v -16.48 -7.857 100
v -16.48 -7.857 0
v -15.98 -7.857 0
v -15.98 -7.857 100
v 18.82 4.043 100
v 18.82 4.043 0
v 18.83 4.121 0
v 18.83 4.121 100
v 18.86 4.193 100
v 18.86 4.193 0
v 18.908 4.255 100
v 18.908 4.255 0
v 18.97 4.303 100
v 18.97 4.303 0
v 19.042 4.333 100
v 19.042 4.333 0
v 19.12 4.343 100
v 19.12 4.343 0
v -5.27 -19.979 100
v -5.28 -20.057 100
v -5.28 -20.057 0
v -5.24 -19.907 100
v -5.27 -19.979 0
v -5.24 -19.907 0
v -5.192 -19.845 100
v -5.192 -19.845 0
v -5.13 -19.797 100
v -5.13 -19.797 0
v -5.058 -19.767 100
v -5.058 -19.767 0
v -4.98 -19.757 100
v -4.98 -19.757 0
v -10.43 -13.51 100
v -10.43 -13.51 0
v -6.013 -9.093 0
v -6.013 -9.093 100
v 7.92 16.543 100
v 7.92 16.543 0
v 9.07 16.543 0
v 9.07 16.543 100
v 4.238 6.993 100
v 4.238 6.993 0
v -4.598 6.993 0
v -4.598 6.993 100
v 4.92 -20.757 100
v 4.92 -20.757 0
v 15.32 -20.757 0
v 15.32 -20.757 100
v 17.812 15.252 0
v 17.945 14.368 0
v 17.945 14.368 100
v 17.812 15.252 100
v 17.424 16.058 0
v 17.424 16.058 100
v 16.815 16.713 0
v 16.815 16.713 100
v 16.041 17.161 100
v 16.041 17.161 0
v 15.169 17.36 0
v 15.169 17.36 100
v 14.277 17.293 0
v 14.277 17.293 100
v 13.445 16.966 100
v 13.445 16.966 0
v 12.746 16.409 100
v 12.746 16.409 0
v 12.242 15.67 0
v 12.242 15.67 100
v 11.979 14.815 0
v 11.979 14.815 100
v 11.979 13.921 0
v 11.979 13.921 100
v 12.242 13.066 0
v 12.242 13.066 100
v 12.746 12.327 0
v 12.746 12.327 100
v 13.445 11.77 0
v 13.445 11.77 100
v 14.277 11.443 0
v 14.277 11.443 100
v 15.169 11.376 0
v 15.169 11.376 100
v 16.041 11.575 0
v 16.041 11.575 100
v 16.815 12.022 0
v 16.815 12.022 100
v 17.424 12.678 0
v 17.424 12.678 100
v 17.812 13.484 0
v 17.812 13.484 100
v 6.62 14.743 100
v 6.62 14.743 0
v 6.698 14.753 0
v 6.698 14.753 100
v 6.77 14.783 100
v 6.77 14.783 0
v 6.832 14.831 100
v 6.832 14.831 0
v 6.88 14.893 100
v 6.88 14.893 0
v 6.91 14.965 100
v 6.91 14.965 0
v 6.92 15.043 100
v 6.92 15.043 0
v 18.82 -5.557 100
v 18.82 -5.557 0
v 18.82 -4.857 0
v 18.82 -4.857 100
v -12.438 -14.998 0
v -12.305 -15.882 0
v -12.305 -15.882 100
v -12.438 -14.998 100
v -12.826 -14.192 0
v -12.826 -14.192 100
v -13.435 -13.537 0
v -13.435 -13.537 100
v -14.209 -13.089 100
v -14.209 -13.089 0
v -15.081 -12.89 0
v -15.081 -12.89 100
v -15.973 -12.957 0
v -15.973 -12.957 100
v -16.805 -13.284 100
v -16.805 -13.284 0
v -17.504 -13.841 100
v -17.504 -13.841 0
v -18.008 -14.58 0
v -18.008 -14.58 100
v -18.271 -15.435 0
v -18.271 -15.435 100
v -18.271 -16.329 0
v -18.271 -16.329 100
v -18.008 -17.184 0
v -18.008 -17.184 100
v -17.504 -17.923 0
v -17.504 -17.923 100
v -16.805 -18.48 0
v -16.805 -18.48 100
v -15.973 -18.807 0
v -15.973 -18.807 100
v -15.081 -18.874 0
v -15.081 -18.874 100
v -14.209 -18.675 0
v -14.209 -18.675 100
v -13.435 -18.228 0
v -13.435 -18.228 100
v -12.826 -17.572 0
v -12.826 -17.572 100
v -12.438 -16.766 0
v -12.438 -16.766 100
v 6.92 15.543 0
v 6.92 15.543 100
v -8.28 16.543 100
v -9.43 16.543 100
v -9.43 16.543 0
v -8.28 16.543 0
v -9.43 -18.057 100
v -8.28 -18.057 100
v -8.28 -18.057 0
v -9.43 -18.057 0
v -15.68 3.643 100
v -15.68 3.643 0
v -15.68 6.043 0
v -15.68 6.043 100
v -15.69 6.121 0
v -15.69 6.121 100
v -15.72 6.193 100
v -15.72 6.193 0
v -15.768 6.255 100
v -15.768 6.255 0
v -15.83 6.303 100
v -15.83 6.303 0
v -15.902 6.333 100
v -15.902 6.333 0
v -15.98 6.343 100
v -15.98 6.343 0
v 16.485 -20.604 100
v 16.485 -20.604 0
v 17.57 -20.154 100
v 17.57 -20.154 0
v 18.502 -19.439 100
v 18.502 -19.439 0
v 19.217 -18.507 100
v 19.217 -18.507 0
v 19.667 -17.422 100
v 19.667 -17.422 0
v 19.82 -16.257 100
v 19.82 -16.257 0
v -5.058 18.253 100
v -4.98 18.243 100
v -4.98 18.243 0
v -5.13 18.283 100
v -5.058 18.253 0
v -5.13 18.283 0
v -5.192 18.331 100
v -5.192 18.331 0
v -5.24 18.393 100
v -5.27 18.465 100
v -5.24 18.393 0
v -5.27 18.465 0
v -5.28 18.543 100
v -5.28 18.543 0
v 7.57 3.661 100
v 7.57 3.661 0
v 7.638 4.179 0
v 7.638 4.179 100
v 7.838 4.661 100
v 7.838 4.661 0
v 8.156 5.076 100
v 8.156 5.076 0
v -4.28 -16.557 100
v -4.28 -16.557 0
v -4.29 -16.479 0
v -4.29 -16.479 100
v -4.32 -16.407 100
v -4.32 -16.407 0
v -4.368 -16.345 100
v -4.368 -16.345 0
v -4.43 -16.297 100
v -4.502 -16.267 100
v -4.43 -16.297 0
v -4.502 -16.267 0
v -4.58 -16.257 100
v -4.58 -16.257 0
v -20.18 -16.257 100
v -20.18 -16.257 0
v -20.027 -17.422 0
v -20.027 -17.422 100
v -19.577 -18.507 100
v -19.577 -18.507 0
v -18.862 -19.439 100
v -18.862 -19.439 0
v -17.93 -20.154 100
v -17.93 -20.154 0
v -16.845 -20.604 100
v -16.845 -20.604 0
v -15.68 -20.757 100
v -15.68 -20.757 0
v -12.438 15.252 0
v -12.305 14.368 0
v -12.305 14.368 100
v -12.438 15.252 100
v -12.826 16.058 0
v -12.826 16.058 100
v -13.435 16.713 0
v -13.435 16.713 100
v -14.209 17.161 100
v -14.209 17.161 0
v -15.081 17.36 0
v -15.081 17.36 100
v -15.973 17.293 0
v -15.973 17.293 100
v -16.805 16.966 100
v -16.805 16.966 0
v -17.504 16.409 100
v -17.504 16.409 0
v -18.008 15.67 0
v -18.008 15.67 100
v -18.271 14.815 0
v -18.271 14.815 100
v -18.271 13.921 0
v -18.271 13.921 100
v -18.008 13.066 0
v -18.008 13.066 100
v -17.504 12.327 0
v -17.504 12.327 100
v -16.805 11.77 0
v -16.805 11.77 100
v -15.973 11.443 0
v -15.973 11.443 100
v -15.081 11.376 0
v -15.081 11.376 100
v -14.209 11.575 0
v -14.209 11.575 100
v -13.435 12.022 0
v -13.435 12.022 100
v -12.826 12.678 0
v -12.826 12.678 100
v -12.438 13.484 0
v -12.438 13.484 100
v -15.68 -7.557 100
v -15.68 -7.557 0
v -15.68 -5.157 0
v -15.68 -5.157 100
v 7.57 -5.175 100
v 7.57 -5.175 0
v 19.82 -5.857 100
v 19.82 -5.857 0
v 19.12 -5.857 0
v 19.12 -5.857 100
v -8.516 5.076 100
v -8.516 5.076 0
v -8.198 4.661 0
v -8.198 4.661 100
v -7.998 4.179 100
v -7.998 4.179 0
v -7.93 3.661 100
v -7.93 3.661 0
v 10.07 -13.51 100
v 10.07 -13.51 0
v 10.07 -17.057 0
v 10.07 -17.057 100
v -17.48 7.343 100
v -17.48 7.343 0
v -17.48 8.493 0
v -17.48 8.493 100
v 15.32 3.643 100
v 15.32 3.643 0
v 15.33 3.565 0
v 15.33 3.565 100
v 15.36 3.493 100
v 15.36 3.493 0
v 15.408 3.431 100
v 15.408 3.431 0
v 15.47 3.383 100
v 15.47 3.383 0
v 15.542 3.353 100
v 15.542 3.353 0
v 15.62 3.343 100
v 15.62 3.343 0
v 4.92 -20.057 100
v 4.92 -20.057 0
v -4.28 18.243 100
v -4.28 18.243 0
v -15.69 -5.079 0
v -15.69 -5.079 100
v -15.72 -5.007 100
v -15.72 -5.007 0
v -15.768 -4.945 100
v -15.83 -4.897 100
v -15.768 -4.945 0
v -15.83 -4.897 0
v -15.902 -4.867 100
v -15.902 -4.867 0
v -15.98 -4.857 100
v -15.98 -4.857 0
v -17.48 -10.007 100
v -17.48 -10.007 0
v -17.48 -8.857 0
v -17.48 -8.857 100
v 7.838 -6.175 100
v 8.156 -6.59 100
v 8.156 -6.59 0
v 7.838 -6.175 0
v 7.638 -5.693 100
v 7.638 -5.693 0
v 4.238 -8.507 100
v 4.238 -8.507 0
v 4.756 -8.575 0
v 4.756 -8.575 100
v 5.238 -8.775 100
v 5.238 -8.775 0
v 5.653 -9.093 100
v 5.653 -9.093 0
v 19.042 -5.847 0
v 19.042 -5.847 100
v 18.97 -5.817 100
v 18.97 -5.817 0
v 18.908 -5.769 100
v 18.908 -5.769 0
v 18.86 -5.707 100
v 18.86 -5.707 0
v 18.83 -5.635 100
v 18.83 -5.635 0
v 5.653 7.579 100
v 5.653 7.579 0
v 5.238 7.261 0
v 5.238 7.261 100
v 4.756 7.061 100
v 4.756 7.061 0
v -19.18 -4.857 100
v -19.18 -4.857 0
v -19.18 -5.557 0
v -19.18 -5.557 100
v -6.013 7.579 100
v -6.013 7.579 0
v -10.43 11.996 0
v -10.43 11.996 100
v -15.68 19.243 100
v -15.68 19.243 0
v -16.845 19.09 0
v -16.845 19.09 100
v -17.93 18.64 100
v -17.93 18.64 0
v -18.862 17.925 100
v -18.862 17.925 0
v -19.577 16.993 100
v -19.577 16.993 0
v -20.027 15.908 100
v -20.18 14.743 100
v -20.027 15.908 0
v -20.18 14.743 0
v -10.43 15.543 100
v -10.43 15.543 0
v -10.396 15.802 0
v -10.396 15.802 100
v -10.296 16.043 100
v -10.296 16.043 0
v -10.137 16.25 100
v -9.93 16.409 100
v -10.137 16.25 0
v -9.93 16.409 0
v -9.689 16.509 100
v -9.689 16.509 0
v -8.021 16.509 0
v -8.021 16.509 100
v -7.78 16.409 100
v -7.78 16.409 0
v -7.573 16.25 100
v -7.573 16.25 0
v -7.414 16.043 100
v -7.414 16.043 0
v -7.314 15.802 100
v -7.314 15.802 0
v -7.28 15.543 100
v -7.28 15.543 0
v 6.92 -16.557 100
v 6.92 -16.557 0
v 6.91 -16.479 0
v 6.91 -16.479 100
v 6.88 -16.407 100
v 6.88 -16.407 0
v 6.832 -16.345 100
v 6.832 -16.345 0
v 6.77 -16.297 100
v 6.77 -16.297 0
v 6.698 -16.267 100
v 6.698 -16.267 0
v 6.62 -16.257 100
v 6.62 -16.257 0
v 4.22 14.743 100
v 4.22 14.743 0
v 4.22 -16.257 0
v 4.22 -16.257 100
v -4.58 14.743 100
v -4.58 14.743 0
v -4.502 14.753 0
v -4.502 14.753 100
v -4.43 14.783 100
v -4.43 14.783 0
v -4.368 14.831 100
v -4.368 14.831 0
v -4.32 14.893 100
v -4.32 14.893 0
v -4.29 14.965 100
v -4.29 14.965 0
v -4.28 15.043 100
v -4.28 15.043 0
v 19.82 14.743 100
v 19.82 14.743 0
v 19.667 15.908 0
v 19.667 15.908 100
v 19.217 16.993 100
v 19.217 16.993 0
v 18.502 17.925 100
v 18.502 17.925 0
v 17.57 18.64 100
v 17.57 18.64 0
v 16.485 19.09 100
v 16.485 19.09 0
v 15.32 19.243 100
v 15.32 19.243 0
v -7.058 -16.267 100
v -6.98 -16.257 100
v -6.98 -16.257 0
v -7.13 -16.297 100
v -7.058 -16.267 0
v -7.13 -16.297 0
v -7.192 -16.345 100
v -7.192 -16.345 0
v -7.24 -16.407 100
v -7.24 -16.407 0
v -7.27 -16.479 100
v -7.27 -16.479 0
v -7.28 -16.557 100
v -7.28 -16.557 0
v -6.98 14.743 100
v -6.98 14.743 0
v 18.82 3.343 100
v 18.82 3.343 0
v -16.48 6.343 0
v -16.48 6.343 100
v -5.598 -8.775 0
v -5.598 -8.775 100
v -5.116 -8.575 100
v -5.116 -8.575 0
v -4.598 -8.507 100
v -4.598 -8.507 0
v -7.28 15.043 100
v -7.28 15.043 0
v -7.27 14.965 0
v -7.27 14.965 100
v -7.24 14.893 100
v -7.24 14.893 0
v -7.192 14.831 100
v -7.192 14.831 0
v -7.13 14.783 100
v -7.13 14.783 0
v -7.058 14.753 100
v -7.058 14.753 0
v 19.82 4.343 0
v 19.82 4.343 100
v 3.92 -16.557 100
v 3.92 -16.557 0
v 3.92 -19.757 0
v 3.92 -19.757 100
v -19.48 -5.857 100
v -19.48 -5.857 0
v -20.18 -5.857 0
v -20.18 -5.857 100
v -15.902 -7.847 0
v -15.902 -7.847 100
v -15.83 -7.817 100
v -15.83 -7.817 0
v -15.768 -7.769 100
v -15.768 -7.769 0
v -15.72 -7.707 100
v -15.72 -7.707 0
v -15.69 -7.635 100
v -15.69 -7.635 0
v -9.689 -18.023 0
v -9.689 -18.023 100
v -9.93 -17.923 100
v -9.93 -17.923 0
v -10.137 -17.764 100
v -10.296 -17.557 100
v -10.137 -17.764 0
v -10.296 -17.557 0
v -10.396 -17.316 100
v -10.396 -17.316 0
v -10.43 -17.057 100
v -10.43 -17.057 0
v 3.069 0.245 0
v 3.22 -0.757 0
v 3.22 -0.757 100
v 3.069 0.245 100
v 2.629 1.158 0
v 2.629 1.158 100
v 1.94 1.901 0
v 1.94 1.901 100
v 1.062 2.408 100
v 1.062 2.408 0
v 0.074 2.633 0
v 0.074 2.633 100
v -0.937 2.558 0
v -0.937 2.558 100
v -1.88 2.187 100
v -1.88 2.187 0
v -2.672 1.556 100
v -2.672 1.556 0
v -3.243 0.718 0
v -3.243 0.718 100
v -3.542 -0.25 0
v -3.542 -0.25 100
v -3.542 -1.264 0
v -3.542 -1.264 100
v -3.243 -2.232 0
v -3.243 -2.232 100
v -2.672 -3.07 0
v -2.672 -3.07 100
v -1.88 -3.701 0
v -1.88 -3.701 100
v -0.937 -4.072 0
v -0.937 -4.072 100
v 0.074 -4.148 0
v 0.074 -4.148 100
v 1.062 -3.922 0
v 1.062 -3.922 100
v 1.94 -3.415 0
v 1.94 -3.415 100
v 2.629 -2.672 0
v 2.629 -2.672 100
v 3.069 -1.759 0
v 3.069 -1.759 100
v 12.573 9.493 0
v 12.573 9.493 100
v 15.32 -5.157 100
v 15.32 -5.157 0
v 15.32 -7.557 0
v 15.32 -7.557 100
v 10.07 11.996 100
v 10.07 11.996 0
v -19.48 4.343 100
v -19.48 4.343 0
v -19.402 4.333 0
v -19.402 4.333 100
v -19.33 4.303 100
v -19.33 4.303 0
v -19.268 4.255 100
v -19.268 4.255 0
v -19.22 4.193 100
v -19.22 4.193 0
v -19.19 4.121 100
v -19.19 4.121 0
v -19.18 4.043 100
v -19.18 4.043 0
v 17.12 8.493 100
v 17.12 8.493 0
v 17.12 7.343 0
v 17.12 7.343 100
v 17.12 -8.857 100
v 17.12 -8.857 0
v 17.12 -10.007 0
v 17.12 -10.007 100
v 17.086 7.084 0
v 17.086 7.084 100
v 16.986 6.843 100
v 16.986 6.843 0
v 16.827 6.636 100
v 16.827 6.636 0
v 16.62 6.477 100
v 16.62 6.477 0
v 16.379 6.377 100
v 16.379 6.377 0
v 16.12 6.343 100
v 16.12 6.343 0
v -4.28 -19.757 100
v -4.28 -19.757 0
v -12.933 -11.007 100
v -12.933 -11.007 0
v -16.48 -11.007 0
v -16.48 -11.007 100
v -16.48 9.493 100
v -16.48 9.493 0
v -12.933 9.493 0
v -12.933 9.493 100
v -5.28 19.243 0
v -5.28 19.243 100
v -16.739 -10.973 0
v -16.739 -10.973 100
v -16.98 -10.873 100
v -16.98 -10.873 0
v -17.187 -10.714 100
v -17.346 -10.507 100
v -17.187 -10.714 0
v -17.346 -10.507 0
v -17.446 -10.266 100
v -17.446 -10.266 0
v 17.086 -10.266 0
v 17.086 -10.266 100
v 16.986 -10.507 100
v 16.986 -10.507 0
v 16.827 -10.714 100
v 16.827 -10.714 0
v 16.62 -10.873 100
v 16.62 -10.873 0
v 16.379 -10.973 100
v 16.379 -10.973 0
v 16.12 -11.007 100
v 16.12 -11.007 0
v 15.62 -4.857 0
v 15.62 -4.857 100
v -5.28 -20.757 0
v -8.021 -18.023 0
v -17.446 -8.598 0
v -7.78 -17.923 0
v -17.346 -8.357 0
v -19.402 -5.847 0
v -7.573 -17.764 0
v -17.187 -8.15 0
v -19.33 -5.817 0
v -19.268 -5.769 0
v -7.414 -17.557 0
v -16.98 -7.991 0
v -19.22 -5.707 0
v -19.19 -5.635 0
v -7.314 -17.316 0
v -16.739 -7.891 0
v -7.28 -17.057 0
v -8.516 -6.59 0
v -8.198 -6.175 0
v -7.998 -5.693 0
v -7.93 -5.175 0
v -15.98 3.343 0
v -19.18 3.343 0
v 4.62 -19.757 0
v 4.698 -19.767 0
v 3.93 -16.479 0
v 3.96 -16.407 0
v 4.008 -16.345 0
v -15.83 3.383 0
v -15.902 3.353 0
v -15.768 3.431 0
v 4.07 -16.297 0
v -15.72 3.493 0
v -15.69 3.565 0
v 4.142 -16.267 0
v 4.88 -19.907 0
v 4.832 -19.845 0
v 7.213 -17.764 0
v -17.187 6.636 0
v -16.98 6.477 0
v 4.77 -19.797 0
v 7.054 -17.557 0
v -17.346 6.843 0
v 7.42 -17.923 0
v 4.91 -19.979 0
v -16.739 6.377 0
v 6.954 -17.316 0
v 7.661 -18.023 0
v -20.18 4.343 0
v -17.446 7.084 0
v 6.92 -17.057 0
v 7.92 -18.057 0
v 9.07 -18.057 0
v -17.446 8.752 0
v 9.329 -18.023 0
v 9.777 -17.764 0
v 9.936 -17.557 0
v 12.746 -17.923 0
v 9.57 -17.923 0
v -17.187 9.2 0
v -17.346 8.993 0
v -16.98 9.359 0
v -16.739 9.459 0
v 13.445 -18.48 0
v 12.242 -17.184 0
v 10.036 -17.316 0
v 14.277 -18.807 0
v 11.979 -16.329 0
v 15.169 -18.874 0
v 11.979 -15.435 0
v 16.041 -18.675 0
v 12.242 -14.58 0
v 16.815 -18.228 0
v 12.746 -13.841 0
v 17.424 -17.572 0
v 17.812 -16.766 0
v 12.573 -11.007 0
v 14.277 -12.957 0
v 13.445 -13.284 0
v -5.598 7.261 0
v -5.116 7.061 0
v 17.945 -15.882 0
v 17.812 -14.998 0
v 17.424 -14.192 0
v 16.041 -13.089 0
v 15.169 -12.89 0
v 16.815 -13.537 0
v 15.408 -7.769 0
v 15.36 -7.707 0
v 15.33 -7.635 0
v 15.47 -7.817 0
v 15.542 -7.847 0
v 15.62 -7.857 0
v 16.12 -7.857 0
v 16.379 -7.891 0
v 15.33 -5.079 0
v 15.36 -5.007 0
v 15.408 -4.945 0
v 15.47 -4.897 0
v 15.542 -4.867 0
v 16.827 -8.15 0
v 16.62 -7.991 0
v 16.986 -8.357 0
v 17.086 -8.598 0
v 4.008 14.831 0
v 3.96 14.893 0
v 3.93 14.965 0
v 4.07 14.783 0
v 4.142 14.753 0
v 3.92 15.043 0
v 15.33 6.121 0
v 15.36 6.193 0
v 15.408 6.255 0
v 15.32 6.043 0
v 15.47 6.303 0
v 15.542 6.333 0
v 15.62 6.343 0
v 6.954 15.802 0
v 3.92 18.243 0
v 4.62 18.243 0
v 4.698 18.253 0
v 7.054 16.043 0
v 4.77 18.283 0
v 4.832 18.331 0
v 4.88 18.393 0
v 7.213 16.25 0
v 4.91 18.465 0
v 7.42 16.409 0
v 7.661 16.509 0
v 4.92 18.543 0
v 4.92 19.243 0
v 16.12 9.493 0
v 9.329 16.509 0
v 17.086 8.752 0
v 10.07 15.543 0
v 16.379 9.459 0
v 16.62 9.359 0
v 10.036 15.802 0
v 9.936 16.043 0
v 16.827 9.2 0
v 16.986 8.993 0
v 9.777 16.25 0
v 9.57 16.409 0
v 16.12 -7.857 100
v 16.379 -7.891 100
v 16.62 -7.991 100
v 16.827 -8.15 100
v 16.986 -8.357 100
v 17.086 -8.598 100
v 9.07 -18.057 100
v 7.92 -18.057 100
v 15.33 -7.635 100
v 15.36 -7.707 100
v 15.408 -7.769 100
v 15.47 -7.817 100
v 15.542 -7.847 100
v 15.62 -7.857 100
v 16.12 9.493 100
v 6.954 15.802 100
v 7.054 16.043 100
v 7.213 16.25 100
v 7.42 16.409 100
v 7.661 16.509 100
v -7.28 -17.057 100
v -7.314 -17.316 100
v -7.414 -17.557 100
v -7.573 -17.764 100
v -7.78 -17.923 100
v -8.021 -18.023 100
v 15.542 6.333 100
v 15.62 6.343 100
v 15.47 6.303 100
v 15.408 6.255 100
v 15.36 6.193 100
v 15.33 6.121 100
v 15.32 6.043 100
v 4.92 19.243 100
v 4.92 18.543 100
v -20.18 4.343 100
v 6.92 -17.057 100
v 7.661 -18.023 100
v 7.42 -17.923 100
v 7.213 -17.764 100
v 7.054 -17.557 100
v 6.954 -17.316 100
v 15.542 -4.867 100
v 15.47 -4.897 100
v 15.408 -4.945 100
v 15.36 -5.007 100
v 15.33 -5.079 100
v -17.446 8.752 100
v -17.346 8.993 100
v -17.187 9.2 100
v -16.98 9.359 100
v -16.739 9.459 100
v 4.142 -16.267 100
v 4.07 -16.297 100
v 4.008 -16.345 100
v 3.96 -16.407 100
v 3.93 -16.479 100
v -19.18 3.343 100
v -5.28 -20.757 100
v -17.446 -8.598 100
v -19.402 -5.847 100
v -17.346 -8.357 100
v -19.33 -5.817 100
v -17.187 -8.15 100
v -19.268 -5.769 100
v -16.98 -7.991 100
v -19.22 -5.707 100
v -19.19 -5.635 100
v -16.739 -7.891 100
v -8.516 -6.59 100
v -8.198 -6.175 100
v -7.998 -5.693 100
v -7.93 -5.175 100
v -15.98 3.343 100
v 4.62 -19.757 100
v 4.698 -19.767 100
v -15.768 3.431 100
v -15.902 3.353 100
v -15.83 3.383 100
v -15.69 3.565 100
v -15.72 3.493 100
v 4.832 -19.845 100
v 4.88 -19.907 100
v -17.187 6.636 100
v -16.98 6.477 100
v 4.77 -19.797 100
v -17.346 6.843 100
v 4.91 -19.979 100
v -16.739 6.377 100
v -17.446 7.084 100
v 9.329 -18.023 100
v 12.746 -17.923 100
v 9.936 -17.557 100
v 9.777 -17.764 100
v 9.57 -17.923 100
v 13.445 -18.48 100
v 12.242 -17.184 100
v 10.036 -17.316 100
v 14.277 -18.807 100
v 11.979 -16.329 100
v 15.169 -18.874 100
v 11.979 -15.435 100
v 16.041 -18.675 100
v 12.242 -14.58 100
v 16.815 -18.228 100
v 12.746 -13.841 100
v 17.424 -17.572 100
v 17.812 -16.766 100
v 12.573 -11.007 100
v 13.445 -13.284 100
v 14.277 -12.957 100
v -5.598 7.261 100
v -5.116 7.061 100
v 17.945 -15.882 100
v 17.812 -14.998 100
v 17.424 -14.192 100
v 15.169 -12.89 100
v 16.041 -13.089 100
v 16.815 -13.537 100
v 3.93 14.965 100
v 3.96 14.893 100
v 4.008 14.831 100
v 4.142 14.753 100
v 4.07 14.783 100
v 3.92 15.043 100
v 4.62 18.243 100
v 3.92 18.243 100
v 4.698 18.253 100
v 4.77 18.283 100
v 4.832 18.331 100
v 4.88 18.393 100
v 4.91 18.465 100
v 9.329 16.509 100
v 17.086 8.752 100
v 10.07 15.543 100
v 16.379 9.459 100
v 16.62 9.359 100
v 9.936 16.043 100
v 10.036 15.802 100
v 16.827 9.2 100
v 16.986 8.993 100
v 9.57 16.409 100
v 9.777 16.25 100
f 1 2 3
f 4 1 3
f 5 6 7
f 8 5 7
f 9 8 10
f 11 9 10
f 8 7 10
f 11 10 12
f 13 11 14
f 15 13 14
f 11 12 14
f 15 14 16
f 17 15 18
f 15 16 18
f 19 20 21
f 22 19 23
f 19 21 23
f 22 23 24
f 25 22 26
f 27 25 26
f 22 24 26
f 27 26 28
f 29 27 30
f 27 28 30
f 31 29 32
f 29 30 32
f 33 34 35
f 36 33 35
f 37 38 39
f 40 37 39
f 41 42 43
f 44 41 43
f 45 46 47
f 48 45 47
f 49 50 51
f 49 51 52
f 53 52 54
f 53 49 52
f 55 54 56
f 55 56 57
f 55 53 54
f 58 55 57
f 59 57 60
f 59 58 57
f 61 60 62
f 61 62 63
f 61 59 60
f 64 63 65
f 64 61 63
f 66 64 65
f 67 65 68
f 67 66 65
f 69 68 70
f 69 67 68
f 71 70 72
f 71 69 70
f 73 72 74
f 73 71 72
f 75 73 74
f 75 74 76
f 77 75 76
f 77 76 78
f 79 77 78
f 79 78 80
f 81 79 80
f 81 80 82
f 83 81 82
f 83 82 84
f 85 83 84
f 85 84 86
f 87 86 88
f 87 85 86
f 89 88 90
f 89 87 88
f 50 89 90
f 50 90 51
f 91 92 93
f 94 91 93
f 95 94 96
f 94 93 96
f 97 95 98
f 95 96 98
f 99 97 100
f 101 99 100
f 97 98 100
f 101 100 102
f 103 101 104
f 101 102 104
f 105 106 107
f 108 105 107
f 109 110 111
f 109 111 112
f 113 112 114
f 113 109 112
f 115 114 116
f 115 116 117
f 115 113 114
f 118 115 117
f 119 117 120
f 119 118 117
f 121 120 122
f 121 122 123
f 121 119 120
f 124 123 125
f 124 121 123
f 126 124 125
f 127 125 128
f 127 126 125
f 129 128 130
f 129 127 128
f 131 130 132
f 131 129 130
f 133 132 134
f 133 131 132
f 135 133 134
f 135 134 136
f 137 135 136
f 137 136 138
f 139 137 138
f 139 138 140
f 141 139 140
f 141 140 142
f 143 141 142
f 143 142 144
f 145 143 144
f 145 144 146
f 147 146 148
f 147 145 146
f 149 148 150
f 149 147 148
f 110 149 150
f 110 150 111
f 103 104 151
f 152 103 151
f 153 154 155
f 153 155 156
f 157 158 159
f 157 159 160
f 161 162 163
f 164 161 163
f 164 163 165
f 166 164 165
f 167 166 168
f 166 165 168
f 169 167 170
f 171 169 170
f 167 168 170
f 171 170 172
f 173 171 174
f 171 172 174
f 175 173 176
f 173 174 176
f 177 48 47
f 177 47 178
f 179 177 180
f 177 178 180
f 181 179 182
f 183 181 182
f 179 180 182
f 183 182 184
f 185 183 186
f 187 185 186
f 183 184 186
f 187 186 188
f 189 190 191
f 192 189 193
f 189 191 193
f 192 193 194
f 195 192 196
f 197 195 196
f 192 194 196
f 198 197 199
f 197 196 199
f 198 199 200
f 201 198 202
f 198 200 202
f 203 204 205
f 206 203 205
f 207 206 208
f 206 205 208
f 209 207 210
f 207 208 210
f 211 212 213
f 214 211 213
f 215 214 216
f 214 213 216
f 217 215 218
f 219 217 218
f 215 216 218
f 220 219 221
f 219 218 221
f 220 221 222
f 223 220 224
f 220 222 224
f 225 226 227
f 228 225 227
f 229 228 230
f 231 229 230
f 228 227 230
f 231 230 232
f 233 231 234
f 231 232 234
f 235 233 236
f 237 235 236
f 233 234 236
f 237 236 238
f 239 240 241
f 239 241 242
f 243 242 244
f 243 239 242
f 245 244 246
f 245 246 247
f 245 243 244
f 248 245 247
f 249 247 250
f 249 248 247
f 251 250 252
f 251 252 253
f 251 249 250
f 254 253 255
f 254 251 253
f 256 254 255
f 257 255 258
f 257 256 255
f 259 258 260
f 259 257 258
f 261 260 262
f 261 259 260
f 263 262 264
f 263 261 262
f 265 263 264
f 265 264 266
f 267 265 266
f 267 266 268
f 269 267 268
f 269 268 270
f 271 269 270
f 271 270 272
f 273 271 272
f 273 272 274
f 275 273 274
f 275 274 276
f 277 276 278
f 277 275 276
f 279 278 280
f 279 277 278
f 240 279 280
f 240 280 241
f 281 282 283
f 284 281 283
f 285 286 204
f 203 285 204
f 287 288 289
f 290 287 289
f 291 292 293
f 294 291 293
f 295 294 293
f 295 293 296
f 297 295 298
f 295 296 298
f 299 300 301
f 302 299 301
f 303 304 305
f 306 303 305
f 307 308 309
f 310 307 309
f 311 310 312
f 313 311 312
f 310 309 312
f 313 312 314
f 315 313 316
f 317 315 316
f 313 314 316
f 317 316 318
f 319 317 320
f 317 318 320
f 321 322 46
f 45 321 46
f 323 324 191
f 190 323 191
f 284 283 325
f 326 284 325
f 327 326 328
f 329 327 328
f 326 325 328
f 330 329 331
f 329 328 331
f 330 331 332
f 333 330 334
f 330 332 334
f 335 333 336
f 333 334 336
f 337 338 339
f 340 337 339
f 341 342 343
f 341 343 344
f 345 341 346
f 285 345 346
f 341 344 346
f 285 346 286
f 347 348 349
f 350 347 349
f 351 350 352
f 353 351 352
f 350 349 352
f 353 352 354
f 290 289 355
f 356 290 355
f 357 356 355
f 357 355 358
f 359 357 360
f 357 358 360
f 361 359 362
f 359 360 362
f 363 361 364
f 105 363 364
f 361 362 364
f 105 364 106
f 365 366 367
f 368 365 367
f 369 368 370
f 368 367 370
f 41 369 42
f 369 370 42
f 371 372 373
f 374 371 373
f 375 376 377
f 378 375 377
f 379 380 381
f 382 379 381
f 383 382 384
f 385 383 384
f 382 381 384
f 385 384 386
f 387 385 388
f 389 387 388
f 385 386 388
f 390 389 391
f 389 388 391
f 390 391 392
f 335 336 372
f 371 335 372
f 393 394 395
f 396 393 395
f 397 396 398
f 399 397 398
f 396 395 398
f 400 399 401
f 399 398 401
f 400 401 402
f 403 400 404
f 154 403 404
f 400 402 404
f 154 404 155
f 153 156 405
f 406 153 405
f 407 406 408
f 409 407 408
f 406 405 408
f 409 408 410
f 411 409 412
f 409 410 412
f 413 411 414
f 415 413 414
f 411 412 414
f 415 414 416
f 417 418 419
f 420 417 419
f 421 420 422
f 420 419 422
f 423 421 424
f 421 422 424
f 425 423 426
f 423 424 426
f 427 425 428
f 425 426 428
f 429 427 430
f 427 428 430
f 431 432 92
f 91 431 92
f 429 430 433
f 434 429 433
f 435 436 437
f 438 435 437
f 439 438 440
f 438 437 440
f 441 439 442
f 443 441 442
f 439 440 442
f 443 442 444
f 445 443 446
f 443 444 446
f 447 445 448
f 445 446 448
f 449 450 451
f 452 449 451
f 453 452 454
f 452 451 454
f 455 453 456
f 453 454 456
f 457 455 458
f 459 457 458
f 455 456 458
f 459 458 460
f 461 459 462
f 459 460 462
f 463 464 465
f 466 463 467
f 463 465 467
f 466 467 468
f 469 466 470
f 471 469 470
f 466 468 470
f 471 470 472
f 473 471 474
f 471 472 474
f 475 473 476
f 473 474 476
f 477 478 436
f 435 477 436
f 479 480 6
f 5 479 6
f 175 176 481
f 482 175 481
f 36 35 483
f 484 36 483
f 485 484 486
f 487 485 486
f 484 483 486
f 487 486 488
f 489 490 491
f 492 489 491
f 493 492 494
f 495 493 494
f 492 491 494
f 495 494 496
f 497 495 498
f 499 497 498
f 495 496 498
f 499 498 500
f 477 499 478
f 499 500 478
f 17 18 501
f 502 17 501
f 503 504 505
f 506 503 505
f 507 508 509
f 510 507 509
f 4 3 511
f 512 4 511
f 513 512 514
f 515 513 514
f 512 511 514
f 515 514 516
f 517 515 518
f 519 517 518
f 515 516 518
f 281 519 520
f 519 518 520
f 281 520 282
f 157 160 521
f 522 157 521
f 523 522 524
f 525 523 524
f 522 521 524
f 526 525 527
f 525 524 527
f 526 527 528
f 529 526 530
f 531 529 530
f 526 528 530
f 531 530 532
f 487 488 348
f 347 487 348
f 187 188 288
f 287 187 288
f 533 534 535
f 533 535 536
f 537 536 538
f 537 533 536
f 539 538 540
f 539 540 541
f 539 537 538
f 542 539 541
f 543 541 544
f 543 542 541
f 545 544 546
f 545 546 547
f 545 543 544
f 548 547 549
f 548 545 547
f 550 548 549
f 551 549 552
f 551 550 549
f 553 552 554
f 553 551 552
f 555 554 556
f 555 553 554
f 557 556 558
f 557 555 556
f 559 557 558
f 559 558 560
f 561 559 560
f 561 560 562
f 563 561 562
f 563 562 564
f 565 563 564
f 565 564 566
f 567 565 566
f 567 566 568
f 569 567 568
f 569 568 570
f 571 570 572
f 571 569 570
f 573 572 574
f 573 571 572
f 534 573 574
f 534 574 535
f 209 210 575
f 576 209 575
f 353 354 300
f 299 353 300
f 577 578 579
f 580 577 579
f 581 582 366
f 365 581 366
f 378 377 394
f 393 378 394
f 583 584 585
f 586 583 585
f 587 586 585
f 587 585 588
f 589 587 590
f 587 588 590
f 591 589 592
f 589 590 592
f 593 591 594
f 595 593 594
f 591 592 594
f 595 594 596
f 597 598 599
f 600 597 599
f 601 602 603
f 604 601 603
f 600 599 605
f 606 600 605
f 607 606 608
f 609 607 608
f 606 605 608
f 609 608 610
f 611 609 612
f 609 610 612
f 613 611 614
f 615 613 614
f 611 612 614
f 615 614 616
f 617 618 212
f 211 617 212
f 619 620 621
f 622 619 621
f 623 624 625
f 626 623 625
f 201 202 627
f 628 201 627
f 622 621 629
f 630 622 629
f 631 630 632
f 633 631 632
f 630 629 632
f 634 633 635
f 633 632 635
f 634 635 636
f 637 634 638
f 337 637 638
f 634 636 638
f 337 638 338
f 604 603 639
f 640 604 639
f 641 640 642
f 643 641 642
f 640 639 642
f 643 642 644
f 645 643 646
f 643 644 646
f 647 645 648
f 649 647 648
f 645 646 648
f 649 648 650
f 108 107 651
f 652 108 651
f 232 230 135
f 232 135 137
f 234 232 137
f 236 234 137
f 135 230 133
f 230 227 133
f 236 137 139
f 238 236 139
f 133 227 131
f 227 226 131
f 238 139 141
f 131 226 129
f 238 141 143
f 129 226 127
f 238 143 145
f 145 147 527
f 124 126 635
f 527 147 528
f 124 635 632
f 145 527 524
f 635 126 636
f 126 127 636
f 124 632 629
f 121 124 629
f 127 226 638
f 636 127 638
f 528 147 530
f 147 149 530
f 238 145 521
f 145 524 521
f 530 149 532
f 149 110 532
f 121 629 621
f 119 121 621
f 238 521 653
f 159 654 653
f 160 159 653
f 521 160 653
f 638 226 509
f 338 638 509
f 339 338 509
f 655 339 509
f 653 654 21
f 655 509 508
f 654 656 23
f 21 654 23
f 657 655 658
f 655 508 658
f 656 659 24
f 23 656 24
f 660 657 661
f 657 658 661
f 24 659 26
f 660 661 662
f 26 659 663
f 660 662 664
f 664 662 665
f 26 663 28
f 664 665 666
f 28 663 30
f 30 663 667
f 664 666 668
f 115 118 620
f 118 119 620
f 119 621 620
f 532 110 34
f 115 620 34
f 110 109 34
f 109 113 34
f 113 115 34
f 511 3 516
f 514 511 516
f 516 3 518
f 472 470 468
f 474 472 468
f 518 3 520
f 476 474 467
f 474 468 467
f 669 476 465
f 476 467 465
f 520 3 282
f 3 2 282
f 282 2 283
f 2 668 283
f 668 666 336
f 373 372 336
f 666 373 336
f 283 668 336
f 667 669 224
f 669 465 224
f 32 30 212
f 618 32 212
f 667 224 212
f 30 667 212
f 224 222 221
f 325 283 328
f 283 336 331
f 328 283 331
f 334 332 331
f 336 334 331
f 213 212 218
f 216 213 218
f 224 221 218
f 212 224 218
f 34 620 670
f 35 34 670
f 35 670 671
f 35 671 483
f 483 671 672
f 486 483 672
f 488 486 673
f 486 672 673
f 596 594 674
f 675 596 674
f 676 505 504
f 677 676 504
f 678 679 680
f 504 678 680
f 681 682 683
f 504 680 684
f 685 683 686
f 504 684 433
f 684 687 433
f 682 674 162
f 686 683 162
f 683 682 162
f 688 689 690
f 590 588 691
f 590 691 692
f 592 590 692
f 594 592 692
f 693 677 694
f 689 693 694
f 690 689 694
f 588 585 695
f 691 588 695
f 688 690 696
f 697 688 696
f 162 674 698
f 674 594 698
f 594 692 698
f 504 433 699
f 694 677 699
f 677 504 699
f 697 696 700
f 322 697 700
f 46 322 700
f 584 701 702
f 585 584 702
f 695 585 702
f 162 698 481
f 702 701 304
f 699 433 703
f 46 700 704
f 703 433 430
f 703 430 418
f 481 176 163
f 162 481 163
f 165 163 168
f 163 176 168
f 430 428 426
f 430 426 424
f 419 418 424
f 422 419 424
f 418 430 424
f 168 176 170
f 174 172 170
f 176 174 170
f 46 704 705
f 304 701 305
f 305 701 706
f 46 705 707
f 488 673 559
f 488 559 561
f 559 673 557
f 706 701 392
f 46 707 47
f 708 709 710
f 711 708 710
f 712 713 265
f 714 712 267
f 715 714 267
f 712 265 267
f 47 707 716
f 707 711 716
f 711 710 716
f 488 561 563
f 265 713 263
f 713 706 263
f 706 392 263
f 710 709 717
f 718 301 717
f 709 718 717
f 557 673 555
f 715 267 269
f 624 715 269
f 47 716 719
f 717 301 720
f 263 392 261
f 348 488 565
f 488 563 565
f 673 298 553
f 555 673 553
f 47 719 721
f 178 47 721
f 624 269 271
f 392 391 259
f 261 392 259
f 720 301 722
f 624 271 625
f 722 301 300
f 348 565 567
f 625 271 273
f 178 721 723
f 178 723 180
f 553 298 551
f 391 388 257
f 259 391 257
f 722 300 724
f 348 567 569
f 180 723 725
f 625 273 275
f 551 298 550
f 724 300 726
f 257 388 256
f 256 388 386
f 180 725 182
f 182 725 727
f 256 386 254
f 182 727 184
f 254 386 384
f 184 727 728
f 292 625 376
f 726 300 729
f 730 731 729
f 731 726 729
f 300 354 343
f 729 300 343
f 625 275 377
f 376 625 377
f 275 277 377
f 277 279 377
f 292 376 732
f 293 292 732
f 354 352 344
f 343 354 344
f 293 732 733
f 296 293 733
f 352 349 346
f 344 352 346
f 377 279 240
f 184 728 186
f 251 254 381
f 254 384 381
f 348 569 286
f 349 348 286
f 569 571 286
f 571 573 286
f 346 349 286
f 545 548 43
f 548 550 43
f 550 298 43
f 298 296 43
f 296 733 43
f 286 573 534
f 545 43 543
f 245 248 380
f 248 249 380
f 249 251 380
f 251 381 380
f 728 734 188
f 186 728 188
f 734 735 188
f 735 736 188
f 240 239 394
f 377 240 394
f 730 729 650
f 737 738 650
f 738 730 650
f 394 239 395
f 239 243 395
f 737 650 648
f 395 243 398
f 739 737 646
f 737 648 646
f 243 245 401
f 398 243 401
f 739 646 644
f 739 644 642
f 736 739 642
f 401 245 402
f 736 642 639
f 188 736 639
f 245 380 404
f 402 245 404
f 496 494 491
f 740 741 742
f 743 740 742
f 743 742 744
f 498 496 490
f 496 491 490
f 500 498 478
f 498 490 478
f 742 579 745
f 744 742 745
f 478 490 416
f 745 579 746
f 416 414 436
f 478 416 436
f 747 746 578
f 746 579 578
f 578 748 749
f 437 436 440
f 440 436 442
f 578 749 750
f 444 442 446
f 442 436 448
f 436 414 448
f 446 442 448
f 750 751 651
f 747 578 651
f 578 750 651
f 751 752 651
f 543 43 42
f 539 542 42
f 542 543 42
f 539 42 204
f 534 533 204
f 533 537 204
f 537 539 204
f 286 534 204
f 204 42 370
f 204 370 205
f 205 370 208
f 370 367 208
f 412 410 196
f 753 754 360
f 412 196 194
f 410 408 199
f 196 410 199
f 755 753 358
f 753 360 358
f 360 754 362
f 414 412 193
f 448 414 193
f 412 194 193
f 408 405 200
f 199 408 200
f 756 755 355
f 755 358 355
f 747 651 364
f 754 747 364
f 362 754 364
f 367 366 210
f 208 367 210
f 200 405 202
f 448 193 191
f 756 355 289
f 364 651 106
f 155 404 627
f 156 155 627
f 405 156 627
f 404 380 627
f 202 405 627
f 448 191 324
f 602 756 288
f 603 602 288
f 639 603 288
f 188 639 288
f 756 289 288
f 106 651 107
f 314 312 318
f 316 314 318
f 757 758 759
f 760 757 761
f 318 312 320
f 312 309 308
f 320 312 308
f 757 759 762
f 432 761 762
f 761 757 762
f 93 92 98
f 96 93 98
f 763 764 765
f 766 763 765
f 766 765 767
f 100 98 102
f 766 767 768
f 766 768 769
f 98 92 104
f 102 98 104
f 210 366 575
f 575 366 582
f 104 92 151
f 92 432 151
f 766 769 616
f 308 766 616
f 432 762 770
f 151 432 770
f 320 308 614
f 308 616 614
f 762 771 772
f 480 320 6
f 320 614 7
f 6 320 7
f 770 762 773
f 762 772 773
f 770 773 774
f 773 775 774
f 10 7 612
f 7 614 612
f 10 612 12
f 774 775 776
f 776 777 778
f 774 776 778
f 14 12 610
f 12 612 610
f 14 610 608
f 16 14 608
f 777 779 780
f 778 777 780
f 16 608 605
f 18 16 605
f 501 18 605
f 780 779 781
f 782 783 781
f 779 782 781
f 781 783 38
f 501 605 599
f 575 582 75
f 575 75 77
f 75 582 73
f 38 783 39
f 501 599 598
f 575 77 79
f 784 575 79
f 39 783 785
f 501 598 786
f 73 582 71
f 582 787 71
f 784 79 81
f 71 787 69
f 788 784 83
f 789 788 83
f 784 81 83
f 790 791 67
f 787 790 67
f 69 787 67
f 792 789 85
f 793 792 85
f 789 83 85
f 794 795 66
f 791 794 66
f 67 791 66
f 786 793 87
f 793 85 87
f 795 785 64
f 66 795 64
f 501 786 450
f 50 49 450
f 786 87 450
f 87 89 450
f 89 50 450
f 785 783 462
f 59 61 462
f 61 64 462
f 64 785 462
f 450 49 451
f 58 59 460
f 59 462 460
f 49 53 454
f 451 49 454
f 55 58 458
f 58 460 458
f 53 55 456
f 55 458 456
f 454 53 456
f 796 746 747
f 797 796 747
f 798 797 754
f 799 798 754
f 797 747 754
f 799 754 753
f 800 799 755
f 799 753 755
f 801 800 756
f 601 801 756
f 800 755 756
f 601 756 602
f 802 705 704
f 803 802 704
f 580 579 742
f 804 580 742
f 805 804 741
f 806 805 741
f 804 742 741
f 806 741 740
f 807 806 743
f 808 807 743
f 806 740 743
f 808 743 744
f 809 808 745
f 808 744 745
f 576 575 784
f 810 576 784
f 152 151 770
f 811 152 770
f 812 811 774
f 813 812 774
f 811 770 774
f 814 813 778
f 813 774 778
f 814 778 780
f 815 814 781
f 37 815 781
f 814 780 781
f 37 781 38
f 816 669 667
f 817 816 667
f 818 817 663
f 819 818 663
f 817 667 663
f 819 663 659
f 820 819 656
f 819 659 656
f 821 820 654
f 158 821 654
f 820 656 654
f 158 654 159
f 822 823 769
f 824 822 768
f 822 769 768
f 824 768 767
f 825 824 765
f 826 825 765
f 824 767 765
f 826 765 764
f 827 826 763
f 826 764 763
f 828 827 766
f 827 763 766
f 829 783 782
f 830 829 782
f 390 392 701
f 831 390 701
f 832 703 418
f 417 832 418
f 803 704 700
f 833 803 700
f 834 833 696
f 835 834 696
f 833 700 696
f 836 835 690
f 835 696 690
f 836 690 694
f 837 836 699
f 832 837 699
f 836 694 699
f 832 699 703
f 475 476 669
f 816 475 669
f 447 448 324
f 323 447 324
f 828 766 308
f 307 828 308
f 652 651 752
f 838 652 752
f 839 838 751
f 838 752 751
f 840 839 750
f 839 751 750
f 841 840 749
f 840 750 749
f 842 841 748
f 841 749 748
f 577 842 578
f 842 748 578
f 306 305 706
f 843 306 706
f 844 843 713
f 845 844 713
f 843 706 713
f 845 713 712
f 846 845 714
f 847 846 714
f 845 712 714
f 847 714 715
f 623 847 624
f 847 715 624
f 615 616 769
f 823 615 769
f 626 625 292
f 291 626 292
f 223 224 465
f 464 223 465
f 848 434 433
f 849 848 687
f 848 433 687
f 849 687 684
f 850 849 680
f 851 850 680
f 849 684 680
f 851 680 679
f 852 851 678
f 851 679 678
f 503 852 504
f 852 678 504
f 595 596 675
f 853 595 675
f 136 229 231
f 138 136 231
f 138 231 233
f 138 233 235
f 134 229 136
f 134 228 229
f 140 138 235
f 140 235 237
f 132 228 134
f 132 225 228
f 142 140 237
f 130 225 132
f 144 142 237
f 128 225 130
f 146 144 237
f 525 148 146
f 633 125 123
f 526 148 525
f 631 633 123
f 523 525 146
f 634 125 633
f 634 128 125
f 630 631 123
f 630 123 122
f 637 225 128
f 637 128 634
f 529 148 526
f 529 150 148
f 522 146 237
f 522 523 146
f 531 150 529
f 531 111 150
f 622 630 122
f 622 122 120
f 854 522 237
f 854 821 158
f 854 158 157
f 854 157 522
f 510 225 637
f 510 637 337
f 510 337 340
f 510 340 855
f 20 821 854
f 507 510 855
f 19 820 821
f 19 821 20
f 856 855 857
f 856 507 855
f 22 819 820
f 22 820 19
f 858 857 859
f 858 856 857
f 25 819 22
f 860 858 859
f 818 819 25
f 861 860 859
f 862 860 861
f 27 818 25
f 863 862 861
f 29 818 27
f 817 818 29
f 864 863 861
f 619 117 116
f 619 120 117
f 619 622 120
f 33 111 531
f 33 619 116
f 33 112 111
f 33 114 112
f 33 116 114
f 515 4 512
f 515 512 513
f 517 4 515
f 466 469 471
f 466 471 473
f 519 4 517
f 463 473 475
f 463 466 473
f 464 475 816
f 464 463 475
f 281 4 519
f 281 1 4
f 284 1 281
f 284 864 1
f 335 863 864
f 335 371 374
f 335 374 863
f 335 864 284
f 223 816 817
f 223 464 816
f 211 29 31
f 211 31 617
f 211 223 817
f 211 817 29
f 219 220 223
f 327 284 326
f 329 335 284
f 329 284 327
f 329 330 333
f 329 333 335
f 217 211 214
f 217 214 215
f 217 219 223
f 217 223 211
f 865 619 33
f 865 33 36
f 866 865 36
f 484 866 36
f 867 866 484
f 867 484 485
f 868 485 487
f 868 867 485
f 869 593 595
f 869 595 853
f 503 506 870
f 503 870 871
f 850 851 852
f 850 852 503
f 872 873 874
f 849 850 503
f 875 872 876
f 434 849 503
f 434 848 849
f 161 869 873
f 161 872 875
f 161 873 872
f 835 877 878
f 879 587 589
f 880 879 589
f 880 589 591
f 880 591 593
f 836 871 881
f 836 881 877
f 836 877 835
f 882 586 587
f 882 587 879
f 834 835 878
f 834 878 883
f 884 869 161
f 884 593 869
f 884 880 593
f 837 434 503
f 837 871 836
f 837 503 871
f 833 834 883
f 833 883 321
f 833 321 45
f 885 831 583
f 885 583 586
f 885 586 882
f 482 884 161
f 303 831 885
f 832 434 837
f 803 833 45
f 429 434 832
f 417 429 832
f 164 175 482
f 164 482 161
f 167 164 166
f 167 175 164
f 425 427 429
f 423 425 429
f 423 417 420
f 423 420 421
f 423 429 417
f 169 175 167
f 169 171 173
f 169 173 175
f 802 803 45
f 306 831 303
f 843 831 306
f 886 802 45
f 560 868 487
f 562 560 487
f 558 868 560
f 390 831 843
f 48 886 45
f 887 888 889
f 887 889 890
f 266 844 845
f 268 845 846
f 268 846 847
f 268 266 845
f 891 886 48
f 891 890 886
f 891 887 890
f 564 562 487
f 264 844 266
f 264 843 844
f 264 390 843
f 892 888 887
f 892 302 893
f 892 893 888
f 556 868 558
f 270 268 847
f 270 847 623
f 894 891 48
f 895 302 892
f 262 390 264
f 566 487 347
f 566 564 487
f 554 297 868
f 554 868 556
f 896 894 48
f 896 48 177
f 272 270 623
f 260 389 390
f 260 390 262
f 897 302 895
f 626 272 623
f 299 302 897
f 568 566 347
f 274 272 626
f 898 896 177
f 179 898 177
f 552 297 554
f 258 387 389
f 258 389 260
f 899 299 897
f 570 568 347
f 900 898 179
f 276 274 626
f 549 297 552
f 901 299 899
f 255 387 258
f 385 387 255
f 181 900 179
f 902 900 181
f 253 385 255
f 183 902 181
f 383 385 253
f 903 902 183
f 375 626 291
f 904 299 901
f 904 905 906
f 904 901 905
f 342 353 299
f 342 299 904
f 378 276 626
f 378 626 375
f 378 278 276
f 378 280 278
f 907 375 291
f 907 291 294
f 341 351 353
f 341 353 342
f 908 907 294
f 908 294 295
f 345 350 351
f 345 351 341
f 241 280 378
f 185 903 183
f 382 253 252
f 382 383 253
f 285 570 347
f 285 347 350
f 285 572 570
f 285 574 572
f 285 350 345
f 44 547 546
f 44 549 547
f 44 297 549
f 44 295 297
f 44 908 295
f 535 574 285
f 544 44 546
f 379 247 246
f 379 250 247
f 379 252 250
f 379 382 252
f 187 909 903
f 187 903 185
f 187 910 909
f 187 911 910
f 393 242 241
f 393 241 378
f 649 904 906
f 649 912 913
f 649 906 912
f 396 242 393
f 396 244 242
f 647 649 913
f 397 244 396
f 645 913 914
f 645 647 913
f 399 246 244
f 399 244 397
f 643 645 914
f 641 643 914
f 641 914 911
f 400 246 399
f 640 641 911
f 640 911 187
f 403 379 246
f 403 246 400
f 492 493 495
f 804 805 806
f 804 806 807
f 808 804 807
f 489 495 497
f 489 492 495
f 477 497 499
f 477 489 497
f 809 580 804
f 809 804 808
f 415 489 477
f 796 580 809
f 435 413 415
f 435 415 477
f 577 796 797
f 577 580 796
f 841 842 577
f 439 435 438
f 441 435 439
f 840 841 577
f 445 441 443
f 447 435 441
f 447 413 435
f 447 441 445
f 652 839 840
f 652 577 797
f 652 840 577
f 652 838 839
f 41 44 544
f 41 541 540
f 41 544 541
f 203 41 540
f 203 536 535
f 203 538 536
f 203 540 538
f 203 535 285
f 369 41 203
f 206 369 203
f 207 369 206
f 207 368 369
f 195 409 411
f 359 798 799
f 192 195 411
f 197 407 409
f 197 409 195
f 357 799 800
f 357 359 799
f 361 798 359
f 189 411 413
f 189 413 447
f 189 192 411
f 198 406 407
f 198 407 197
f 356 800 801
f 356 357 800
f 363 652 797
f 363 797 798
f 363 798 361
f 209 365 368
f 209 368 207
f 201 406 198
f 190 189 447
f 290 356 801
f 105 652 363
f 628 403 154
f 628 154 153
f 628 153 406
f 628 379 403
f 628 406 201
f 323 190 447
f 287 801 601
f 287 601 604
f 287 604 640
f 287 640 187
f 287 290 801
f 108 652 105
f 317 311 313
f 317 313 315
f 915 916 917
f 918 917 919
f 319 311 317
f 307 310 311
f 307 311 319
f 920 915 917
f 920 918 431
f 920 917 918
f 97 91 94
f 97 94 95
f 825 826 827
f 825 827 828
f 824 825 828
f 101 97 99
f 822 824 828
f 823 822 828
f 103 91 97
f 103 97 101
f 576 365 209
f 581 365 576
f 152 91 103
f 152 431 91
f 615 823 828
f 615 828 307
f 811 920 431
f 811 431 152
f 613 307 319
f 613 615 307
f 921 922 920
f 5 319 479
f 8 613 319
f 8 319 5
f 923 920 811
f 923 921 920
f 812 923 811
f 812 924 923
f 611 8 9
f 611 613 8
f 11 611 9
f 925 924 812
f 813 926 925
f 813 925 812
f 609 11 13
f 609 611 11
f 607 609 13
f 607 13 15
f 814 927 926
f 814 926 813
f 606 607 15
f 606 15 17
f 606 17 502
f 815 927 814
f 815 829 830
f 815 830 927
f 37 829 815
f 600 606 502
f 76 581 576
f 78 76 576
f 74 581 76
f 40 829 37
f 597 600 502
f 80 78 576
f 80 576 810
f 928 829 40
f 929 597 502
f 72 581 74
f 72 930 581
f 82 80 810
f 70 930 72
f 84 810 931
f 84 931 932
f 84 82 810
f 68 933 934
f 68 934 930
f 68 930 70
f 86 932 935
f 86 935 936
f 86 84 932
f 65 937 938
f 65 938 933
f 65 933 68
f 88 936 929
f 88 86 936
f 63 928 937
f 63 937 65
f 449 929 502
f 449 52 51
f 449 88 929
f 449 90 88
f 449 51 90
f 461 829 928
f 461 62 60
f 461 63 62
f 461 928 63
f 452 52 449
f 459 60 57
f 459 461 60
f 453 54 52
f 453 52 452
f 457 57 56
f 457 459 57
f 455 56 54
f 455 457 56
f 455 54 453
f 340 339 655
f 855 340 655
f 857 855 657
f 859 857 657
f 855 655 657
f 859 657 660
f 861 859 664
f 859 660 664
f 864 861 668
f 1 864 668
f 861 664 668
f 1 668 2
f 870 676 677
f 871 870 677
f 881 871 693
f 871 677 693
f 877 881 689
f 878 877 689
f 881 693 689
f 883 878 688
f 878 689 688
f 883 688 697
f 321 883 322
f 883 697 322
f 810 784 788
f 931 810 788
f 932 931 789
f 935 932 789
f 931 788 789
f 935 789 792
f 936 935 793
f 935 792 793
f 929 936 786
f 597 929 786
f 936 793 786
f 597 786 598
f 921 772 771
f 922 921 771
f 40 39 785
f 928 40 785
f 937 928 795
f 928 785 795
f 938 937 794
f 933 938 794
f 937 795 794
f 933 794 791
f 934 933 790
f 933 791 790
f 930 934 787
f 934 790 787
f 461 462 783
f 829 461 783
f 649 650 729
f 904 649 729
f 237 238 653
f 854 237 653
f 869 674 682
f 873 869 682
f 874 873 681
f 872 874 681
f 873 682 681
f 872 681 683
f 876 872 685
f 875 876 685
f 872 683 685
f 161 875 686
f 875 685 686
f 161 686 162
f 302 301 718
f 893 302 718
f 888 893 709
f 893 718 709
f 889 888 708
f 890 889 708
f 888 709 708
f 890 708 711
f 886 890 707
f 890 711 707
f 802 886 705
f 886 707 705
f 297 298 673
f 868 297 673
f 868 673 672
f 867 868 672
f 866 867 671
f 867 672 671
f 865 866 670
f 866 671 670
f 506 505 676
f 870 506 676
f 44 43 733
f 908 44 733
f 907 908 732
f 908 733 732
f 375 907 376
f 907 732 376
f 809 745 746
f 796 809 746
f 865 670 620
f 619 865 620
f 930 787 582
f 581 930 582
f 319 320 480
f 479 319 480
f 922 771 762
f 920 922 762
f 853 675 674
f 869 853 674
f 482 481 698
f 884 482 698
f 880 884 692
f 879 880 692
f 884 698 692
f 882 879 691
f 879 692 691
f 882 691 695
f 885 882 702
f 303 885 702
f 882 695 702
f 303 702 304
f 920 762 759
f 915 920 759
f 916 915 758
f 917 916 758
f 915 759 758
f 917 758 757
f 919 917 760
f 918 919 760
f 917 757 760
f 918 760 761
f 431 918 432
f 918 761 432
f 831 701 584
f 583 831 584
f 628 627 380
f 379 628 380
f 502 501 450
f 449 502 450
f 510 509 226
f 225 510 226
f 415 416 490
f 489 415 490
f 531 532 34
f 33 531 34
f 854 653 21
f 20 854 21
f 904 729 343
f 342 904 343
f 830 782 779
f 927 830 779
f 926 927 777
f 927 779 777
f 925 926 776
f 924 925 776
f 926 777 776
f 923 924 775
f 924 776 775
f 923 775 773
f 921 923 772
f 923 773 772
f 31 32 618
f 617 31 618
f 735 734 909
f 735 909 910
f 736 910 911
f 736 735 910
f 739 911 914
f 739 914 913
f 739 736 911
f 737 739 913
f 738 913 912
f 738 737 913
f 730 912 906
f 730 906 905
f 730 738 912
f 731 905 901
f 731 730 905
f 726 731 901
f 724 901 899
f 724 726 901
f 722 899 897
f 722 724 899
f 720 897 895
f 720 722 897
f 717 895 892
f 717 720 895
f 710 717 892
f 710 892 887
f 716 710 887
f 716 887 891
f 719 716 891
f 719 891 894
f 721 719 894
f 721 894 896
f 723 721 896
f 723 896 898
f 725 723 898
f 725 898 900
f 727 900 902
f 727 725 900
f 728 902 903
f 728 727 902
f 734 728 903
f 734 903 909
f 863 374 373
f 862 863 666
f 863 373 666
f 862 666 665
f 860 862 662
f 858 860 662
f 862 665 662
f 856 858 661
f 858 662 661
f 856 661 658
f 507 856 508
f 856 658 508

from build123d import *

# Parameters (mm, degrees)
SKETCH_1_R      = 3.4
SKETCH_1_R_2    = 3
EXTRUDE_1_DEPTH = 100


with BuildPart() as part:
    # 草图1 → 凸台-拉伸1 (new body)
    with BuildSketch(Plane.XY):
        with BuildLine():
            Line((-5.280003001, 19.242987377), (-15.680003001, 19.242987377))
            ThreePointArc((-15.680003001, 19.242987377), (-18.861983517, 17.924967893), (-20.180003001, 14.742987377))
            Line((-20.180003001, 14.742987377), (-20.180003001, 4.342987377))
            Line((-20.180003001, 4.342987377), (-19.480003001, 4.342987377))
            ThreePointArc((-19.480003001, 4.342987377), (-19.267870967, 4.255119412), (-19.180003001, 4.042987377))
            Line((-19.180003001, 4.042987377), (-19.180003001, 3.342987377))
            Line((-19.180003001, 3.342987377), (-15.980003001, 3.342987377))
            ThreePointArc((-15.980003001, 3.342987377), (-15.767870967, 3.430855343), (-15.680003001, 3.642987377))
            Line((-15.680003001, 3.642987377), (-15.680003001, 6.042987377))
            ThreePointArc((-15.680003001, 6.042987377), (-15.767870967, 6.255119412), (-15.980003001, 6.342987377))
            Line((-15.980003001, 6.342987377), (-16.480003001, 6.342987377))
            ThreePointArc((-16.480003001, 6.342987377), (-17.187109783, 6.635880596), (-17.480003001, 7.342987377))
            Line((-17.480003001, 7.342987377), (-17.480003001, 8.492987377))
            ThreePointArc((-17.480003001, 8.492987377), (-17.187109783, 9.200094158), (-16.480003001, 9.492987377))
            Line((-16.480003001, 9.492987377), (-12.933161007, 9.492987377))
            Line((-12.933161007, 9.492987377), (-8.515789439, 5.07561581))
            ThreePointArc((-8.515789439, 5.07561581), (-8.082243936, 4.426769112), (-7.930003001, 3.661402247))
            Line((-7.930003001, 3.661402247), (-7.930003001, -5.175427493))
            ThreePointArc((-7.930003001, -5.175427493), (-8.082243936, -5.940794357), (-8.515789439, -6.589641055))
            Line((-8.515789439, -6.589641055), (-12.933161007, -11.007012623))
            Line((-12.933161007, -11.007012623), (-16.480003001, -11.007012623))
            ThreePointArc((-16.480003001, -11.007012623), (-17.187109783, -10.714119404), (-17.480003001, -10.007012623))
            Line((-17.480003001, -10.007012623), (-17.480003001, -8.857012623))
            ThreePointArc((-17.480003001, -8.857012623), (-17.187109783, -8.149905842), (-16.480003001, -7.857012623))
            Line((-16.480003001, -7.857012623), (-15.980003001, -7.857012623))
            ThreePointArc((-15.980003001, -7.857012623), (-15.767870967, -7.769144657), (-15.680003001, -7.557012623))
            Line((-15.680003001, -7.557012623), (-15.680003001, -5.157012623))
            ThreePointArc((-15.680003001, -5.157012623), (-15.767870967, -4.944880588), (-15.980003001, -4.857012623))
            Line((-15.980003001, -4.857012623), (-19.180003001, -4.857012623))
            Line((-19.180003001, -4.857012623), (-19.180003001, -5.557012623))
            ThreePointArc((-19.180003001, -5.557012623), (-19.267870967, -5.769144657), (-19.480003001, -5.857012623))
            Line((-19.480003001, -5.857012623), (-20.180003001, -5.857012623))
            Line((-20.180003001, -5.857012623), (-20.180003001, -16.257012623))
            ThreePointArc((-20.180003001, -16.257012623), (-18.861983517, -19.438993138), (-15.680003001, -20.757012623))
            Line((-15.680003001, -20.757012623), (-5.280003001, -20.757012623))
            Line((-5.280003001, -20.757012623), (-5.280003001, -20.057012623))
            ThreePointArc((-5.280003001, -20.057012623), (-5.192135036, -19.844880588), (-4.980003001, -19.757012623))
            Line((-4.980003001, -19.757012623), (-4.280003001, -19.757012623))
            Line((-4.280003001, -19.757012623), (-4.280003001, -16.557012623))
            ThreePointArc((-4.280003001, -16.557012623), (-4.367870967, -16.344880588), (-4.580003001, -16.257012623))
            Line((-4.580003001, -16.257012623), (-6.980003001, -16.257012623))
            ThreePointArc((-6.980003001, -16.257012623), (-7.192135036, -16.344880588), (-7.280003001, -16.557012623))
            Line((-7.280003001, -16.557012623), (-7.280003001, -17.057012623))
            ThreePointArc((-7.280003001, -17.057012623), (-7.57289622, -17.764119404), (-8.280003001, -18.057012623))
            Line((-8.280003001, -18.057012623), (-9.430003001, -18.057012623))
            ThreePointArc((-9.430003001, -18.057012623), (-10.137109783, -17.764119404), (-10.430003001, -17.057012623))
            Line((-10.430003001, -17.057012623), (-10.430003001, -13.510170628))
            Line((-10.430003001, -13.510170628), (-6.012631434, -9.09279906))
            ThreePointArc((-6.012631434, -9.09279906), (-5.363784736, -8.659253558), (-4.598417871, -8.507012623))
            Line((-4.598417871, -8.507012623), (4.238411868, -8.507012623))
            ThreePointArc((4.238411868, -8.507012623), (5.003778733, -8.659253558), (5.652625431, -9.09279906))
            Line((5.652625431, -9.09279906), (10.069996999, -13.510170628))
            Line((10.069996999, -13.510170628), (10.069996999, -17.057012623))
            ThreePointArc((10.069996999, -17.057012623), (9.77710378, -17.764119404), (9.069996999, -18.057012623))
            Line((9.069996999, -18.057012623), (7.919996999, -18.057012623))
            ThreePointArc((7.919996999, -18.057012623), (7.212890217, -17.764119404), (6.919996999, -17.057012623))
            Line((6.919996999, -17.057012623), (6.919996999, -16.557012623))
            ThreePointArc((6.919996999, -16.557012623), (6.832129033, -16.344880588), (6.619996999, -16.257012623))
            Line((6.619996999, -16.257012623), (4.219996999, -16.257012623))
            ThreePointArc((4.219996999, -16.257012623), (4.007864964, -16.344880588), (3.919996999, -16.557012623))
            Line((3.919996999, -16.557012623), (3.919996999, -19.757012623))
            Line((3.919996999, -19.757012623), (4.619996999, -19.757012623))
            ThreePointArc((4.619996999, -19.757012623), (4.832129033, -19.844880588), (4.919996999, -20.057012623))
            Line((4.919996999, -20.057012623), (4.919996999, -20.757012623))
            Line((4.919996999, -20.757012623), (15.319996999, -20.757012623))
            ThreePointArc((15.319996999, -20.757012623), (18.501977514, -19.438993138), (19.819996999, -16.257012623))
            Line((19.819996999, -16.257012623), (19.819996999, -5.857012623))
            Line((19.819996999, -5.857012623), (19.119996999, -5.857012623))
            ThreePointArc((19.119996999, -5.857012623), (18.907864964, -5.769144657), (18.819996999, -5.557012623))
            Line((18.819996999, -5.557012623), (18.819996999, -4.857012623))
            Line((18.819996999, -4.857012623), (15.619996999, -4.857012623))
            ThreePointArc((15.619996999, -4.857012623), (15.407864964, -4.944880588), (15.319996999, -5.157012623))
            Line((15.319996999, -5.157012623), (15.319996999, -7.557012623))
            ThreePointArc((15.319996999, -7.557012623), (15.407864964, -7.769144657), (15.619996999, -7.857012623))
            Line((15.619996999, -7.857012623), (16.119996999, -7.857012623))
            ThreePointArc((16.119996999, -7.857012623), (16.82710378, -8.149905842), (17.119996999, -8.857012623))
            Line((17.119996999, -8.857012623), (17.119996999, -10.007012623))
            ThreePointArc((17.119996999, -10.007012623), (16.82710378, -10.714119404), (16.119996999, -11.007012623))
            Line((16.119996999, -11.007012623), (12.573155004, -11.007012623))
            Line((12.573155004, -11.007012623), (8.155783436, -6.589641055))
            ThreePointArc((8.155783436, -6.589641055), (7.722237934, -5.940794357), (7.569996999, -5.175427493))
            Line((7.569996999, -5.175427493), (7.569996999, 3.661402247))
            ThreePointArc((7.569996999, 3.661402247), (7.722237934, 4.426769112), (8.155783436, 5.07561581))
            Line((8.155783436, 5.07561581), (12.573155004, 9.492987377))
            Line((12.573155004, 9.492987377), (16.119996999, 9.492987377))
            ThreePointArc((16.119996999, 9.492987377), (16.82710378, 9.200094158), (17.119996999, 8.492987377))
            Line((17.119996999, 8.492987377), (17.119996999, 7.342987377))
            ThreePointArc((17.119996999, 7.342987377), (16.82710378, 6.635880596), (16.119996999, 6.342987377))
            Line((16.119996999, 6.342987377), (15.619996999, 6.342987377))
            ThreePointArc((15.619996999, 6.342987377), (15.407864964, 6.255119412), (15.319996999, 6.042987377))
            Line((15.319996999, 6.042987377), (15.319996999, 3.642987377))
            ThreePointArc((15.319996999, 3.642987377), (15.407864964, 3.430855343), (15.619996999, 3.342987377))
            Line((15.619996999, 3.342987377), (18.819996999, 3.342987377))
            Line((18.819996999, 3.342987377), (18.819996999, 4.042987377))
            ThreePointArc((18.819996999, 4.042987377), (18.907864964, 4.255119412), (19.119996999, 4.342987377))
            Line((19.119996999, 4.342987377), (19.819996999, 4.342987377))
            Line((19.819996999, 4.342987377), (19.819996999, 14.742987377))
            ThreePointArc((19.819996999, 14.742987377), (18.501977514, 17.924967893), (15.319996999, 19.242987377))
            Line((15.319996999, 19.242987377), (4.919996999, 19.242987377))
            Line((4.919996999, 19.242987377), (4.919996999, 18.542987377))
            ThreePointArc((4.919996999, 18.542987377), (4.832129033, 18.330855343), (4.619996999, 18.242987377))
            Line((4.619996999, 18.242987377), (3.919996999, 18.242987377))
            Line((3.919996999, 18.242987377), (3.919996999, 15.042987377))
            ThreePointArc((3.919996999, 15.042987377), (4.007864964, 14.830855343), (4.219996999, 14.742987377))
            Line((4.219996999, 14.742987377), (6.619996999, 14.742987377))
            ThreePointArc((6.619996999, 14.742987377), (6.832129033, 14.830855343), (6.919996999, 15.042987377))
            Line((6.919996999, 15.042987377), (6.919996999, 15.542987377))
            ThreePointArc((6.919996999, 15.542987377), (7.212890217, 16.250094158), (7.919996999, 16.542987377))
            Line((7.919996999, 16.542987377), (9.069996999, 16.542987377))
            ThreePointArc((9.069996999, 16.542987377), (9.77710378, 16.250094158), (10.069996999, 15.542987377))
            Line((10.069996999, 15.542987377), (10.069996999, 11.996145383))
            Line((10.069996999, 11.996145383), (5.652625431, 7.578773815))
            ThreePointArc((5.652625431, 7.578773815), (5.003778733, 7.145228312), (4.238411868, 6.992987377))
            Line((4.238411868, 6.992987377), (-4.598417871, 6.992987377))
            ThreePointArc((-4.598417871, 6.992987377), (-5.363784736, 7.145228312), (-6.012631434, 7.578773815))
            Line((-6.012631434, 7.578773815), (-10.430003001, 11.996145383))
            Line((-10.430003001, 11.996145383), (-10.430003001, 15.542987377))
            ThreePointArc((-10.430003001, 15.542987377), (-10.137109783, 16.250094158), (-9.430003001, 16.542987377))
            Line((-9.430003001, 16.542987377), (-8.280003001, 16.542987377))
            ThreePointArc((-8.280003001, 16.542987377), (-7.57289622, 16.250094158), (-7.280003001, 15.542987377))
            Line((-7.280003001, 15.542987377), (-7.280003001, 15.042987377))
            ThreePointArc((-7.280003001, 15.042987377), (-7.192135036, 14.830855343), (-6.980003001, 14.742987377))
            Line((-6.980003001, 14.742987377), (-4.580003001, 14.742987377))
            ThreePointArc((-4.580003001, 14.742987377), (-4.367870967, 14.830855343), (-4.280003001, 15.042987377))
            Line((-4.280003001, 15.042987377), (-4.280003001, 18.242987377))
            Line((-4.280003001, 18.242987377), (-4.980003001, 18.242987377))
            ThreePointArc((-4.980003001, 18.242987377), (-5.192135036, 18.330855343), (-5.280003001, 18.542987377))
            Line((-5.280003001, 18.542987377), (-5.280003001, 19.242987377))
        make_face()
        with Locations((-0.180003001, -0.757012623)):
            Circle(SKETCH_1_R, mode=Mode.SUBTRACT)
        with Locations((-15.305003001, 14.367987377)):
            Circle(SKETCH_1_R_2, mode=Mode.SUBTRACT)
        with Locations((14.944996999, 14.367987377)):
            Circle(SKETCH_1_R_2, mode=Mode.SUBTRACT)
        with Locations((-15.305003001, -15.882012623)):
            Circle(SKETCH_1_R_2, mode=Mode.SUBTRACT)
        with Locations((14.944996999, -15.882012623)):
            Circle(SKETCH_1_R_2, mode=Mode.SUBTRACT)
    extrude(amount=EXTRUDE_1_DEPTH)


solid = part.part
